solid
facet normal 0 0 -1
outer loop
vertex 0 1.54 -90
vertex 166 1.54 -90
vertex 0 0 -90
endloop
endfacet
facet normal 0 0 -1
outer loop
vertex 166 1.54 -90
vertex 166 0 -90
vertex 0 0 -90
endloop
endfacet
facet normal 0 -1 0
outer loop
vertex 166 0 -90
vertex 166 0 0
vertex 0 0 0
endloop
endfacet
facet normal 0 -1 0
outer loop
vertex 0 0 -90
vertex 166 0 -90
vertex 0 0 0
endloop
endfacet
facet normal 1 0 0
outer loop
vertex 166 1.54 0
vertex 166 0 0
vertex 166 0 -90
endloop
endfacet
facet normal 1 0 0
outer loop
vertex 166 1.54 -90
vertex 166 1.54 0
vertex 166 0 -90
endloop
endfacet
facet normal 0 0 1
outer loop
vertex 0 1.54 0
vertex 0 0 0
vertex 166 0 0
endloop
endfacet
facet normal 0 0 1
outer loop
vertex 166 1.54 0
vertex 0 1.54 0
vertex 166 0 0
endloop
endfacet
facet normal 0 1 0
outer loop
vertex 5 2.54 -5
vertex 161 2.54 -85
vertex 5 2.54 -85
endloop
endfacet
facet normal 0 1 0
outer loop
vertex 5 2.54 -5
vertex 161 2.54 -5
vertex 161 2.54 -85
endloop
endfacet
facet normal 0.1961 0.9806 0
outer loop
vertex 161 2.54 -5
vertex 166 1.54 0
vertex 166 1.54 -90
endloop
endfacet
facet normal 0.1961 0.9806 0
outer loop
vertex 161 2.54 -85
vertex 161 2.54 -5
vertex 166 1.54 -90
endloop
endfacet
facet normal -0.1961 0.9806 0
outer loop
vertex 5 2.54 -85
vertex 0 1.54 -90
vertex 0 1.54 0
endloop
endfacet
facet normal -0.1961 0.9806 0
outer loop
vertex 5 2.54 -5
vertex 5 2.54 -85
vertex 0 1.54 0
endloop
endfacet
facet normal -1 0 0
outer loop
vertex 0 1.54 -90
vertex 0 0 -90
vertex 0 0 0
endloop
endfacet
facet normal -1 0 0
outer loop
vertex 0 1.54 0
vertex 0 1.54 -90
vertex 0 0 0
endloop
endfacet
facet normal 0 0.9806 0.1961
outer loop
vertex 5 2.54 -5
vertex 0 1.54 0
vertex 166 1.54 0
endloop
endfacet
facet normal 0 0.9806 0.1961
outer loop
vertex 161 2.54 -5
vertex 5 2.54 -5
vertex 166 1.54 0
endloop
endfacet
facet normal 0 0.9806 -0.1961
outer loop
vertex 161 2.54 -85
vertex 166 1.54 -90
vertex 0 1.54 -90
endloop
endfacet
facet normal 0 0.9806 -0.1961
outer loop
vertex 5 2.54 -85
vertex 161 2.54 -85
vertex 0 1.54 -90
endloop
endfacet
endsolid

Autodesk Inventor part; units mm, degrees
ref_plane "YZ Plane" through (0, 0, 0) normal (1, 0, 0) x (0, 1, 0)
ref_plane "XZ Plane" through (0, 0, 0) normal (0, 1, 0) x (-1, 0, 0)
ref_plane "XY Plane" through (0, 0, 0) normal (0, 0, 1) x (1, 0, 0)
sketch "Sketch1" plane through (0, 0, 0) normal (0, 1, 0) x (-1, 0, 0)
  line L0 (0, 0) -> (-166, 0)
  line L1 (-166, 0) -> (-166, -90)
  line L2 (-166, -90) -> (0, -90)
  line L3 (0, -90) -> (0, 0)
  dimension "d0" = 166
  dimension "d1" = 90
extrude "Extrusion1" add sketch "Sketch1" along normal blind 2.54
chamfer "Chamfer1" distance 5 distance2 1 1 edges at (83, 2.54, -90) measured on face at (110.6667, 2.54, -30)
chamfer "Chamfer2" distance 5 distance2 1 1 edges at (0, 2.54, -42.5) measured on face at (110.6667, 2.54, -28.3333)
chamfer "Chamfer3" distance 5 distance2 1 1 edges at (85.5, 2.54, 0) measured on face at (58.6667, 2.54, -56.6667)
chamfer "Chamfer4" distance 5 distance2 1 1 edges at (166, 2.54, -45) measured on face at (112.3333, 2.54, -31.6667)
properties part number "SolarPanel"
